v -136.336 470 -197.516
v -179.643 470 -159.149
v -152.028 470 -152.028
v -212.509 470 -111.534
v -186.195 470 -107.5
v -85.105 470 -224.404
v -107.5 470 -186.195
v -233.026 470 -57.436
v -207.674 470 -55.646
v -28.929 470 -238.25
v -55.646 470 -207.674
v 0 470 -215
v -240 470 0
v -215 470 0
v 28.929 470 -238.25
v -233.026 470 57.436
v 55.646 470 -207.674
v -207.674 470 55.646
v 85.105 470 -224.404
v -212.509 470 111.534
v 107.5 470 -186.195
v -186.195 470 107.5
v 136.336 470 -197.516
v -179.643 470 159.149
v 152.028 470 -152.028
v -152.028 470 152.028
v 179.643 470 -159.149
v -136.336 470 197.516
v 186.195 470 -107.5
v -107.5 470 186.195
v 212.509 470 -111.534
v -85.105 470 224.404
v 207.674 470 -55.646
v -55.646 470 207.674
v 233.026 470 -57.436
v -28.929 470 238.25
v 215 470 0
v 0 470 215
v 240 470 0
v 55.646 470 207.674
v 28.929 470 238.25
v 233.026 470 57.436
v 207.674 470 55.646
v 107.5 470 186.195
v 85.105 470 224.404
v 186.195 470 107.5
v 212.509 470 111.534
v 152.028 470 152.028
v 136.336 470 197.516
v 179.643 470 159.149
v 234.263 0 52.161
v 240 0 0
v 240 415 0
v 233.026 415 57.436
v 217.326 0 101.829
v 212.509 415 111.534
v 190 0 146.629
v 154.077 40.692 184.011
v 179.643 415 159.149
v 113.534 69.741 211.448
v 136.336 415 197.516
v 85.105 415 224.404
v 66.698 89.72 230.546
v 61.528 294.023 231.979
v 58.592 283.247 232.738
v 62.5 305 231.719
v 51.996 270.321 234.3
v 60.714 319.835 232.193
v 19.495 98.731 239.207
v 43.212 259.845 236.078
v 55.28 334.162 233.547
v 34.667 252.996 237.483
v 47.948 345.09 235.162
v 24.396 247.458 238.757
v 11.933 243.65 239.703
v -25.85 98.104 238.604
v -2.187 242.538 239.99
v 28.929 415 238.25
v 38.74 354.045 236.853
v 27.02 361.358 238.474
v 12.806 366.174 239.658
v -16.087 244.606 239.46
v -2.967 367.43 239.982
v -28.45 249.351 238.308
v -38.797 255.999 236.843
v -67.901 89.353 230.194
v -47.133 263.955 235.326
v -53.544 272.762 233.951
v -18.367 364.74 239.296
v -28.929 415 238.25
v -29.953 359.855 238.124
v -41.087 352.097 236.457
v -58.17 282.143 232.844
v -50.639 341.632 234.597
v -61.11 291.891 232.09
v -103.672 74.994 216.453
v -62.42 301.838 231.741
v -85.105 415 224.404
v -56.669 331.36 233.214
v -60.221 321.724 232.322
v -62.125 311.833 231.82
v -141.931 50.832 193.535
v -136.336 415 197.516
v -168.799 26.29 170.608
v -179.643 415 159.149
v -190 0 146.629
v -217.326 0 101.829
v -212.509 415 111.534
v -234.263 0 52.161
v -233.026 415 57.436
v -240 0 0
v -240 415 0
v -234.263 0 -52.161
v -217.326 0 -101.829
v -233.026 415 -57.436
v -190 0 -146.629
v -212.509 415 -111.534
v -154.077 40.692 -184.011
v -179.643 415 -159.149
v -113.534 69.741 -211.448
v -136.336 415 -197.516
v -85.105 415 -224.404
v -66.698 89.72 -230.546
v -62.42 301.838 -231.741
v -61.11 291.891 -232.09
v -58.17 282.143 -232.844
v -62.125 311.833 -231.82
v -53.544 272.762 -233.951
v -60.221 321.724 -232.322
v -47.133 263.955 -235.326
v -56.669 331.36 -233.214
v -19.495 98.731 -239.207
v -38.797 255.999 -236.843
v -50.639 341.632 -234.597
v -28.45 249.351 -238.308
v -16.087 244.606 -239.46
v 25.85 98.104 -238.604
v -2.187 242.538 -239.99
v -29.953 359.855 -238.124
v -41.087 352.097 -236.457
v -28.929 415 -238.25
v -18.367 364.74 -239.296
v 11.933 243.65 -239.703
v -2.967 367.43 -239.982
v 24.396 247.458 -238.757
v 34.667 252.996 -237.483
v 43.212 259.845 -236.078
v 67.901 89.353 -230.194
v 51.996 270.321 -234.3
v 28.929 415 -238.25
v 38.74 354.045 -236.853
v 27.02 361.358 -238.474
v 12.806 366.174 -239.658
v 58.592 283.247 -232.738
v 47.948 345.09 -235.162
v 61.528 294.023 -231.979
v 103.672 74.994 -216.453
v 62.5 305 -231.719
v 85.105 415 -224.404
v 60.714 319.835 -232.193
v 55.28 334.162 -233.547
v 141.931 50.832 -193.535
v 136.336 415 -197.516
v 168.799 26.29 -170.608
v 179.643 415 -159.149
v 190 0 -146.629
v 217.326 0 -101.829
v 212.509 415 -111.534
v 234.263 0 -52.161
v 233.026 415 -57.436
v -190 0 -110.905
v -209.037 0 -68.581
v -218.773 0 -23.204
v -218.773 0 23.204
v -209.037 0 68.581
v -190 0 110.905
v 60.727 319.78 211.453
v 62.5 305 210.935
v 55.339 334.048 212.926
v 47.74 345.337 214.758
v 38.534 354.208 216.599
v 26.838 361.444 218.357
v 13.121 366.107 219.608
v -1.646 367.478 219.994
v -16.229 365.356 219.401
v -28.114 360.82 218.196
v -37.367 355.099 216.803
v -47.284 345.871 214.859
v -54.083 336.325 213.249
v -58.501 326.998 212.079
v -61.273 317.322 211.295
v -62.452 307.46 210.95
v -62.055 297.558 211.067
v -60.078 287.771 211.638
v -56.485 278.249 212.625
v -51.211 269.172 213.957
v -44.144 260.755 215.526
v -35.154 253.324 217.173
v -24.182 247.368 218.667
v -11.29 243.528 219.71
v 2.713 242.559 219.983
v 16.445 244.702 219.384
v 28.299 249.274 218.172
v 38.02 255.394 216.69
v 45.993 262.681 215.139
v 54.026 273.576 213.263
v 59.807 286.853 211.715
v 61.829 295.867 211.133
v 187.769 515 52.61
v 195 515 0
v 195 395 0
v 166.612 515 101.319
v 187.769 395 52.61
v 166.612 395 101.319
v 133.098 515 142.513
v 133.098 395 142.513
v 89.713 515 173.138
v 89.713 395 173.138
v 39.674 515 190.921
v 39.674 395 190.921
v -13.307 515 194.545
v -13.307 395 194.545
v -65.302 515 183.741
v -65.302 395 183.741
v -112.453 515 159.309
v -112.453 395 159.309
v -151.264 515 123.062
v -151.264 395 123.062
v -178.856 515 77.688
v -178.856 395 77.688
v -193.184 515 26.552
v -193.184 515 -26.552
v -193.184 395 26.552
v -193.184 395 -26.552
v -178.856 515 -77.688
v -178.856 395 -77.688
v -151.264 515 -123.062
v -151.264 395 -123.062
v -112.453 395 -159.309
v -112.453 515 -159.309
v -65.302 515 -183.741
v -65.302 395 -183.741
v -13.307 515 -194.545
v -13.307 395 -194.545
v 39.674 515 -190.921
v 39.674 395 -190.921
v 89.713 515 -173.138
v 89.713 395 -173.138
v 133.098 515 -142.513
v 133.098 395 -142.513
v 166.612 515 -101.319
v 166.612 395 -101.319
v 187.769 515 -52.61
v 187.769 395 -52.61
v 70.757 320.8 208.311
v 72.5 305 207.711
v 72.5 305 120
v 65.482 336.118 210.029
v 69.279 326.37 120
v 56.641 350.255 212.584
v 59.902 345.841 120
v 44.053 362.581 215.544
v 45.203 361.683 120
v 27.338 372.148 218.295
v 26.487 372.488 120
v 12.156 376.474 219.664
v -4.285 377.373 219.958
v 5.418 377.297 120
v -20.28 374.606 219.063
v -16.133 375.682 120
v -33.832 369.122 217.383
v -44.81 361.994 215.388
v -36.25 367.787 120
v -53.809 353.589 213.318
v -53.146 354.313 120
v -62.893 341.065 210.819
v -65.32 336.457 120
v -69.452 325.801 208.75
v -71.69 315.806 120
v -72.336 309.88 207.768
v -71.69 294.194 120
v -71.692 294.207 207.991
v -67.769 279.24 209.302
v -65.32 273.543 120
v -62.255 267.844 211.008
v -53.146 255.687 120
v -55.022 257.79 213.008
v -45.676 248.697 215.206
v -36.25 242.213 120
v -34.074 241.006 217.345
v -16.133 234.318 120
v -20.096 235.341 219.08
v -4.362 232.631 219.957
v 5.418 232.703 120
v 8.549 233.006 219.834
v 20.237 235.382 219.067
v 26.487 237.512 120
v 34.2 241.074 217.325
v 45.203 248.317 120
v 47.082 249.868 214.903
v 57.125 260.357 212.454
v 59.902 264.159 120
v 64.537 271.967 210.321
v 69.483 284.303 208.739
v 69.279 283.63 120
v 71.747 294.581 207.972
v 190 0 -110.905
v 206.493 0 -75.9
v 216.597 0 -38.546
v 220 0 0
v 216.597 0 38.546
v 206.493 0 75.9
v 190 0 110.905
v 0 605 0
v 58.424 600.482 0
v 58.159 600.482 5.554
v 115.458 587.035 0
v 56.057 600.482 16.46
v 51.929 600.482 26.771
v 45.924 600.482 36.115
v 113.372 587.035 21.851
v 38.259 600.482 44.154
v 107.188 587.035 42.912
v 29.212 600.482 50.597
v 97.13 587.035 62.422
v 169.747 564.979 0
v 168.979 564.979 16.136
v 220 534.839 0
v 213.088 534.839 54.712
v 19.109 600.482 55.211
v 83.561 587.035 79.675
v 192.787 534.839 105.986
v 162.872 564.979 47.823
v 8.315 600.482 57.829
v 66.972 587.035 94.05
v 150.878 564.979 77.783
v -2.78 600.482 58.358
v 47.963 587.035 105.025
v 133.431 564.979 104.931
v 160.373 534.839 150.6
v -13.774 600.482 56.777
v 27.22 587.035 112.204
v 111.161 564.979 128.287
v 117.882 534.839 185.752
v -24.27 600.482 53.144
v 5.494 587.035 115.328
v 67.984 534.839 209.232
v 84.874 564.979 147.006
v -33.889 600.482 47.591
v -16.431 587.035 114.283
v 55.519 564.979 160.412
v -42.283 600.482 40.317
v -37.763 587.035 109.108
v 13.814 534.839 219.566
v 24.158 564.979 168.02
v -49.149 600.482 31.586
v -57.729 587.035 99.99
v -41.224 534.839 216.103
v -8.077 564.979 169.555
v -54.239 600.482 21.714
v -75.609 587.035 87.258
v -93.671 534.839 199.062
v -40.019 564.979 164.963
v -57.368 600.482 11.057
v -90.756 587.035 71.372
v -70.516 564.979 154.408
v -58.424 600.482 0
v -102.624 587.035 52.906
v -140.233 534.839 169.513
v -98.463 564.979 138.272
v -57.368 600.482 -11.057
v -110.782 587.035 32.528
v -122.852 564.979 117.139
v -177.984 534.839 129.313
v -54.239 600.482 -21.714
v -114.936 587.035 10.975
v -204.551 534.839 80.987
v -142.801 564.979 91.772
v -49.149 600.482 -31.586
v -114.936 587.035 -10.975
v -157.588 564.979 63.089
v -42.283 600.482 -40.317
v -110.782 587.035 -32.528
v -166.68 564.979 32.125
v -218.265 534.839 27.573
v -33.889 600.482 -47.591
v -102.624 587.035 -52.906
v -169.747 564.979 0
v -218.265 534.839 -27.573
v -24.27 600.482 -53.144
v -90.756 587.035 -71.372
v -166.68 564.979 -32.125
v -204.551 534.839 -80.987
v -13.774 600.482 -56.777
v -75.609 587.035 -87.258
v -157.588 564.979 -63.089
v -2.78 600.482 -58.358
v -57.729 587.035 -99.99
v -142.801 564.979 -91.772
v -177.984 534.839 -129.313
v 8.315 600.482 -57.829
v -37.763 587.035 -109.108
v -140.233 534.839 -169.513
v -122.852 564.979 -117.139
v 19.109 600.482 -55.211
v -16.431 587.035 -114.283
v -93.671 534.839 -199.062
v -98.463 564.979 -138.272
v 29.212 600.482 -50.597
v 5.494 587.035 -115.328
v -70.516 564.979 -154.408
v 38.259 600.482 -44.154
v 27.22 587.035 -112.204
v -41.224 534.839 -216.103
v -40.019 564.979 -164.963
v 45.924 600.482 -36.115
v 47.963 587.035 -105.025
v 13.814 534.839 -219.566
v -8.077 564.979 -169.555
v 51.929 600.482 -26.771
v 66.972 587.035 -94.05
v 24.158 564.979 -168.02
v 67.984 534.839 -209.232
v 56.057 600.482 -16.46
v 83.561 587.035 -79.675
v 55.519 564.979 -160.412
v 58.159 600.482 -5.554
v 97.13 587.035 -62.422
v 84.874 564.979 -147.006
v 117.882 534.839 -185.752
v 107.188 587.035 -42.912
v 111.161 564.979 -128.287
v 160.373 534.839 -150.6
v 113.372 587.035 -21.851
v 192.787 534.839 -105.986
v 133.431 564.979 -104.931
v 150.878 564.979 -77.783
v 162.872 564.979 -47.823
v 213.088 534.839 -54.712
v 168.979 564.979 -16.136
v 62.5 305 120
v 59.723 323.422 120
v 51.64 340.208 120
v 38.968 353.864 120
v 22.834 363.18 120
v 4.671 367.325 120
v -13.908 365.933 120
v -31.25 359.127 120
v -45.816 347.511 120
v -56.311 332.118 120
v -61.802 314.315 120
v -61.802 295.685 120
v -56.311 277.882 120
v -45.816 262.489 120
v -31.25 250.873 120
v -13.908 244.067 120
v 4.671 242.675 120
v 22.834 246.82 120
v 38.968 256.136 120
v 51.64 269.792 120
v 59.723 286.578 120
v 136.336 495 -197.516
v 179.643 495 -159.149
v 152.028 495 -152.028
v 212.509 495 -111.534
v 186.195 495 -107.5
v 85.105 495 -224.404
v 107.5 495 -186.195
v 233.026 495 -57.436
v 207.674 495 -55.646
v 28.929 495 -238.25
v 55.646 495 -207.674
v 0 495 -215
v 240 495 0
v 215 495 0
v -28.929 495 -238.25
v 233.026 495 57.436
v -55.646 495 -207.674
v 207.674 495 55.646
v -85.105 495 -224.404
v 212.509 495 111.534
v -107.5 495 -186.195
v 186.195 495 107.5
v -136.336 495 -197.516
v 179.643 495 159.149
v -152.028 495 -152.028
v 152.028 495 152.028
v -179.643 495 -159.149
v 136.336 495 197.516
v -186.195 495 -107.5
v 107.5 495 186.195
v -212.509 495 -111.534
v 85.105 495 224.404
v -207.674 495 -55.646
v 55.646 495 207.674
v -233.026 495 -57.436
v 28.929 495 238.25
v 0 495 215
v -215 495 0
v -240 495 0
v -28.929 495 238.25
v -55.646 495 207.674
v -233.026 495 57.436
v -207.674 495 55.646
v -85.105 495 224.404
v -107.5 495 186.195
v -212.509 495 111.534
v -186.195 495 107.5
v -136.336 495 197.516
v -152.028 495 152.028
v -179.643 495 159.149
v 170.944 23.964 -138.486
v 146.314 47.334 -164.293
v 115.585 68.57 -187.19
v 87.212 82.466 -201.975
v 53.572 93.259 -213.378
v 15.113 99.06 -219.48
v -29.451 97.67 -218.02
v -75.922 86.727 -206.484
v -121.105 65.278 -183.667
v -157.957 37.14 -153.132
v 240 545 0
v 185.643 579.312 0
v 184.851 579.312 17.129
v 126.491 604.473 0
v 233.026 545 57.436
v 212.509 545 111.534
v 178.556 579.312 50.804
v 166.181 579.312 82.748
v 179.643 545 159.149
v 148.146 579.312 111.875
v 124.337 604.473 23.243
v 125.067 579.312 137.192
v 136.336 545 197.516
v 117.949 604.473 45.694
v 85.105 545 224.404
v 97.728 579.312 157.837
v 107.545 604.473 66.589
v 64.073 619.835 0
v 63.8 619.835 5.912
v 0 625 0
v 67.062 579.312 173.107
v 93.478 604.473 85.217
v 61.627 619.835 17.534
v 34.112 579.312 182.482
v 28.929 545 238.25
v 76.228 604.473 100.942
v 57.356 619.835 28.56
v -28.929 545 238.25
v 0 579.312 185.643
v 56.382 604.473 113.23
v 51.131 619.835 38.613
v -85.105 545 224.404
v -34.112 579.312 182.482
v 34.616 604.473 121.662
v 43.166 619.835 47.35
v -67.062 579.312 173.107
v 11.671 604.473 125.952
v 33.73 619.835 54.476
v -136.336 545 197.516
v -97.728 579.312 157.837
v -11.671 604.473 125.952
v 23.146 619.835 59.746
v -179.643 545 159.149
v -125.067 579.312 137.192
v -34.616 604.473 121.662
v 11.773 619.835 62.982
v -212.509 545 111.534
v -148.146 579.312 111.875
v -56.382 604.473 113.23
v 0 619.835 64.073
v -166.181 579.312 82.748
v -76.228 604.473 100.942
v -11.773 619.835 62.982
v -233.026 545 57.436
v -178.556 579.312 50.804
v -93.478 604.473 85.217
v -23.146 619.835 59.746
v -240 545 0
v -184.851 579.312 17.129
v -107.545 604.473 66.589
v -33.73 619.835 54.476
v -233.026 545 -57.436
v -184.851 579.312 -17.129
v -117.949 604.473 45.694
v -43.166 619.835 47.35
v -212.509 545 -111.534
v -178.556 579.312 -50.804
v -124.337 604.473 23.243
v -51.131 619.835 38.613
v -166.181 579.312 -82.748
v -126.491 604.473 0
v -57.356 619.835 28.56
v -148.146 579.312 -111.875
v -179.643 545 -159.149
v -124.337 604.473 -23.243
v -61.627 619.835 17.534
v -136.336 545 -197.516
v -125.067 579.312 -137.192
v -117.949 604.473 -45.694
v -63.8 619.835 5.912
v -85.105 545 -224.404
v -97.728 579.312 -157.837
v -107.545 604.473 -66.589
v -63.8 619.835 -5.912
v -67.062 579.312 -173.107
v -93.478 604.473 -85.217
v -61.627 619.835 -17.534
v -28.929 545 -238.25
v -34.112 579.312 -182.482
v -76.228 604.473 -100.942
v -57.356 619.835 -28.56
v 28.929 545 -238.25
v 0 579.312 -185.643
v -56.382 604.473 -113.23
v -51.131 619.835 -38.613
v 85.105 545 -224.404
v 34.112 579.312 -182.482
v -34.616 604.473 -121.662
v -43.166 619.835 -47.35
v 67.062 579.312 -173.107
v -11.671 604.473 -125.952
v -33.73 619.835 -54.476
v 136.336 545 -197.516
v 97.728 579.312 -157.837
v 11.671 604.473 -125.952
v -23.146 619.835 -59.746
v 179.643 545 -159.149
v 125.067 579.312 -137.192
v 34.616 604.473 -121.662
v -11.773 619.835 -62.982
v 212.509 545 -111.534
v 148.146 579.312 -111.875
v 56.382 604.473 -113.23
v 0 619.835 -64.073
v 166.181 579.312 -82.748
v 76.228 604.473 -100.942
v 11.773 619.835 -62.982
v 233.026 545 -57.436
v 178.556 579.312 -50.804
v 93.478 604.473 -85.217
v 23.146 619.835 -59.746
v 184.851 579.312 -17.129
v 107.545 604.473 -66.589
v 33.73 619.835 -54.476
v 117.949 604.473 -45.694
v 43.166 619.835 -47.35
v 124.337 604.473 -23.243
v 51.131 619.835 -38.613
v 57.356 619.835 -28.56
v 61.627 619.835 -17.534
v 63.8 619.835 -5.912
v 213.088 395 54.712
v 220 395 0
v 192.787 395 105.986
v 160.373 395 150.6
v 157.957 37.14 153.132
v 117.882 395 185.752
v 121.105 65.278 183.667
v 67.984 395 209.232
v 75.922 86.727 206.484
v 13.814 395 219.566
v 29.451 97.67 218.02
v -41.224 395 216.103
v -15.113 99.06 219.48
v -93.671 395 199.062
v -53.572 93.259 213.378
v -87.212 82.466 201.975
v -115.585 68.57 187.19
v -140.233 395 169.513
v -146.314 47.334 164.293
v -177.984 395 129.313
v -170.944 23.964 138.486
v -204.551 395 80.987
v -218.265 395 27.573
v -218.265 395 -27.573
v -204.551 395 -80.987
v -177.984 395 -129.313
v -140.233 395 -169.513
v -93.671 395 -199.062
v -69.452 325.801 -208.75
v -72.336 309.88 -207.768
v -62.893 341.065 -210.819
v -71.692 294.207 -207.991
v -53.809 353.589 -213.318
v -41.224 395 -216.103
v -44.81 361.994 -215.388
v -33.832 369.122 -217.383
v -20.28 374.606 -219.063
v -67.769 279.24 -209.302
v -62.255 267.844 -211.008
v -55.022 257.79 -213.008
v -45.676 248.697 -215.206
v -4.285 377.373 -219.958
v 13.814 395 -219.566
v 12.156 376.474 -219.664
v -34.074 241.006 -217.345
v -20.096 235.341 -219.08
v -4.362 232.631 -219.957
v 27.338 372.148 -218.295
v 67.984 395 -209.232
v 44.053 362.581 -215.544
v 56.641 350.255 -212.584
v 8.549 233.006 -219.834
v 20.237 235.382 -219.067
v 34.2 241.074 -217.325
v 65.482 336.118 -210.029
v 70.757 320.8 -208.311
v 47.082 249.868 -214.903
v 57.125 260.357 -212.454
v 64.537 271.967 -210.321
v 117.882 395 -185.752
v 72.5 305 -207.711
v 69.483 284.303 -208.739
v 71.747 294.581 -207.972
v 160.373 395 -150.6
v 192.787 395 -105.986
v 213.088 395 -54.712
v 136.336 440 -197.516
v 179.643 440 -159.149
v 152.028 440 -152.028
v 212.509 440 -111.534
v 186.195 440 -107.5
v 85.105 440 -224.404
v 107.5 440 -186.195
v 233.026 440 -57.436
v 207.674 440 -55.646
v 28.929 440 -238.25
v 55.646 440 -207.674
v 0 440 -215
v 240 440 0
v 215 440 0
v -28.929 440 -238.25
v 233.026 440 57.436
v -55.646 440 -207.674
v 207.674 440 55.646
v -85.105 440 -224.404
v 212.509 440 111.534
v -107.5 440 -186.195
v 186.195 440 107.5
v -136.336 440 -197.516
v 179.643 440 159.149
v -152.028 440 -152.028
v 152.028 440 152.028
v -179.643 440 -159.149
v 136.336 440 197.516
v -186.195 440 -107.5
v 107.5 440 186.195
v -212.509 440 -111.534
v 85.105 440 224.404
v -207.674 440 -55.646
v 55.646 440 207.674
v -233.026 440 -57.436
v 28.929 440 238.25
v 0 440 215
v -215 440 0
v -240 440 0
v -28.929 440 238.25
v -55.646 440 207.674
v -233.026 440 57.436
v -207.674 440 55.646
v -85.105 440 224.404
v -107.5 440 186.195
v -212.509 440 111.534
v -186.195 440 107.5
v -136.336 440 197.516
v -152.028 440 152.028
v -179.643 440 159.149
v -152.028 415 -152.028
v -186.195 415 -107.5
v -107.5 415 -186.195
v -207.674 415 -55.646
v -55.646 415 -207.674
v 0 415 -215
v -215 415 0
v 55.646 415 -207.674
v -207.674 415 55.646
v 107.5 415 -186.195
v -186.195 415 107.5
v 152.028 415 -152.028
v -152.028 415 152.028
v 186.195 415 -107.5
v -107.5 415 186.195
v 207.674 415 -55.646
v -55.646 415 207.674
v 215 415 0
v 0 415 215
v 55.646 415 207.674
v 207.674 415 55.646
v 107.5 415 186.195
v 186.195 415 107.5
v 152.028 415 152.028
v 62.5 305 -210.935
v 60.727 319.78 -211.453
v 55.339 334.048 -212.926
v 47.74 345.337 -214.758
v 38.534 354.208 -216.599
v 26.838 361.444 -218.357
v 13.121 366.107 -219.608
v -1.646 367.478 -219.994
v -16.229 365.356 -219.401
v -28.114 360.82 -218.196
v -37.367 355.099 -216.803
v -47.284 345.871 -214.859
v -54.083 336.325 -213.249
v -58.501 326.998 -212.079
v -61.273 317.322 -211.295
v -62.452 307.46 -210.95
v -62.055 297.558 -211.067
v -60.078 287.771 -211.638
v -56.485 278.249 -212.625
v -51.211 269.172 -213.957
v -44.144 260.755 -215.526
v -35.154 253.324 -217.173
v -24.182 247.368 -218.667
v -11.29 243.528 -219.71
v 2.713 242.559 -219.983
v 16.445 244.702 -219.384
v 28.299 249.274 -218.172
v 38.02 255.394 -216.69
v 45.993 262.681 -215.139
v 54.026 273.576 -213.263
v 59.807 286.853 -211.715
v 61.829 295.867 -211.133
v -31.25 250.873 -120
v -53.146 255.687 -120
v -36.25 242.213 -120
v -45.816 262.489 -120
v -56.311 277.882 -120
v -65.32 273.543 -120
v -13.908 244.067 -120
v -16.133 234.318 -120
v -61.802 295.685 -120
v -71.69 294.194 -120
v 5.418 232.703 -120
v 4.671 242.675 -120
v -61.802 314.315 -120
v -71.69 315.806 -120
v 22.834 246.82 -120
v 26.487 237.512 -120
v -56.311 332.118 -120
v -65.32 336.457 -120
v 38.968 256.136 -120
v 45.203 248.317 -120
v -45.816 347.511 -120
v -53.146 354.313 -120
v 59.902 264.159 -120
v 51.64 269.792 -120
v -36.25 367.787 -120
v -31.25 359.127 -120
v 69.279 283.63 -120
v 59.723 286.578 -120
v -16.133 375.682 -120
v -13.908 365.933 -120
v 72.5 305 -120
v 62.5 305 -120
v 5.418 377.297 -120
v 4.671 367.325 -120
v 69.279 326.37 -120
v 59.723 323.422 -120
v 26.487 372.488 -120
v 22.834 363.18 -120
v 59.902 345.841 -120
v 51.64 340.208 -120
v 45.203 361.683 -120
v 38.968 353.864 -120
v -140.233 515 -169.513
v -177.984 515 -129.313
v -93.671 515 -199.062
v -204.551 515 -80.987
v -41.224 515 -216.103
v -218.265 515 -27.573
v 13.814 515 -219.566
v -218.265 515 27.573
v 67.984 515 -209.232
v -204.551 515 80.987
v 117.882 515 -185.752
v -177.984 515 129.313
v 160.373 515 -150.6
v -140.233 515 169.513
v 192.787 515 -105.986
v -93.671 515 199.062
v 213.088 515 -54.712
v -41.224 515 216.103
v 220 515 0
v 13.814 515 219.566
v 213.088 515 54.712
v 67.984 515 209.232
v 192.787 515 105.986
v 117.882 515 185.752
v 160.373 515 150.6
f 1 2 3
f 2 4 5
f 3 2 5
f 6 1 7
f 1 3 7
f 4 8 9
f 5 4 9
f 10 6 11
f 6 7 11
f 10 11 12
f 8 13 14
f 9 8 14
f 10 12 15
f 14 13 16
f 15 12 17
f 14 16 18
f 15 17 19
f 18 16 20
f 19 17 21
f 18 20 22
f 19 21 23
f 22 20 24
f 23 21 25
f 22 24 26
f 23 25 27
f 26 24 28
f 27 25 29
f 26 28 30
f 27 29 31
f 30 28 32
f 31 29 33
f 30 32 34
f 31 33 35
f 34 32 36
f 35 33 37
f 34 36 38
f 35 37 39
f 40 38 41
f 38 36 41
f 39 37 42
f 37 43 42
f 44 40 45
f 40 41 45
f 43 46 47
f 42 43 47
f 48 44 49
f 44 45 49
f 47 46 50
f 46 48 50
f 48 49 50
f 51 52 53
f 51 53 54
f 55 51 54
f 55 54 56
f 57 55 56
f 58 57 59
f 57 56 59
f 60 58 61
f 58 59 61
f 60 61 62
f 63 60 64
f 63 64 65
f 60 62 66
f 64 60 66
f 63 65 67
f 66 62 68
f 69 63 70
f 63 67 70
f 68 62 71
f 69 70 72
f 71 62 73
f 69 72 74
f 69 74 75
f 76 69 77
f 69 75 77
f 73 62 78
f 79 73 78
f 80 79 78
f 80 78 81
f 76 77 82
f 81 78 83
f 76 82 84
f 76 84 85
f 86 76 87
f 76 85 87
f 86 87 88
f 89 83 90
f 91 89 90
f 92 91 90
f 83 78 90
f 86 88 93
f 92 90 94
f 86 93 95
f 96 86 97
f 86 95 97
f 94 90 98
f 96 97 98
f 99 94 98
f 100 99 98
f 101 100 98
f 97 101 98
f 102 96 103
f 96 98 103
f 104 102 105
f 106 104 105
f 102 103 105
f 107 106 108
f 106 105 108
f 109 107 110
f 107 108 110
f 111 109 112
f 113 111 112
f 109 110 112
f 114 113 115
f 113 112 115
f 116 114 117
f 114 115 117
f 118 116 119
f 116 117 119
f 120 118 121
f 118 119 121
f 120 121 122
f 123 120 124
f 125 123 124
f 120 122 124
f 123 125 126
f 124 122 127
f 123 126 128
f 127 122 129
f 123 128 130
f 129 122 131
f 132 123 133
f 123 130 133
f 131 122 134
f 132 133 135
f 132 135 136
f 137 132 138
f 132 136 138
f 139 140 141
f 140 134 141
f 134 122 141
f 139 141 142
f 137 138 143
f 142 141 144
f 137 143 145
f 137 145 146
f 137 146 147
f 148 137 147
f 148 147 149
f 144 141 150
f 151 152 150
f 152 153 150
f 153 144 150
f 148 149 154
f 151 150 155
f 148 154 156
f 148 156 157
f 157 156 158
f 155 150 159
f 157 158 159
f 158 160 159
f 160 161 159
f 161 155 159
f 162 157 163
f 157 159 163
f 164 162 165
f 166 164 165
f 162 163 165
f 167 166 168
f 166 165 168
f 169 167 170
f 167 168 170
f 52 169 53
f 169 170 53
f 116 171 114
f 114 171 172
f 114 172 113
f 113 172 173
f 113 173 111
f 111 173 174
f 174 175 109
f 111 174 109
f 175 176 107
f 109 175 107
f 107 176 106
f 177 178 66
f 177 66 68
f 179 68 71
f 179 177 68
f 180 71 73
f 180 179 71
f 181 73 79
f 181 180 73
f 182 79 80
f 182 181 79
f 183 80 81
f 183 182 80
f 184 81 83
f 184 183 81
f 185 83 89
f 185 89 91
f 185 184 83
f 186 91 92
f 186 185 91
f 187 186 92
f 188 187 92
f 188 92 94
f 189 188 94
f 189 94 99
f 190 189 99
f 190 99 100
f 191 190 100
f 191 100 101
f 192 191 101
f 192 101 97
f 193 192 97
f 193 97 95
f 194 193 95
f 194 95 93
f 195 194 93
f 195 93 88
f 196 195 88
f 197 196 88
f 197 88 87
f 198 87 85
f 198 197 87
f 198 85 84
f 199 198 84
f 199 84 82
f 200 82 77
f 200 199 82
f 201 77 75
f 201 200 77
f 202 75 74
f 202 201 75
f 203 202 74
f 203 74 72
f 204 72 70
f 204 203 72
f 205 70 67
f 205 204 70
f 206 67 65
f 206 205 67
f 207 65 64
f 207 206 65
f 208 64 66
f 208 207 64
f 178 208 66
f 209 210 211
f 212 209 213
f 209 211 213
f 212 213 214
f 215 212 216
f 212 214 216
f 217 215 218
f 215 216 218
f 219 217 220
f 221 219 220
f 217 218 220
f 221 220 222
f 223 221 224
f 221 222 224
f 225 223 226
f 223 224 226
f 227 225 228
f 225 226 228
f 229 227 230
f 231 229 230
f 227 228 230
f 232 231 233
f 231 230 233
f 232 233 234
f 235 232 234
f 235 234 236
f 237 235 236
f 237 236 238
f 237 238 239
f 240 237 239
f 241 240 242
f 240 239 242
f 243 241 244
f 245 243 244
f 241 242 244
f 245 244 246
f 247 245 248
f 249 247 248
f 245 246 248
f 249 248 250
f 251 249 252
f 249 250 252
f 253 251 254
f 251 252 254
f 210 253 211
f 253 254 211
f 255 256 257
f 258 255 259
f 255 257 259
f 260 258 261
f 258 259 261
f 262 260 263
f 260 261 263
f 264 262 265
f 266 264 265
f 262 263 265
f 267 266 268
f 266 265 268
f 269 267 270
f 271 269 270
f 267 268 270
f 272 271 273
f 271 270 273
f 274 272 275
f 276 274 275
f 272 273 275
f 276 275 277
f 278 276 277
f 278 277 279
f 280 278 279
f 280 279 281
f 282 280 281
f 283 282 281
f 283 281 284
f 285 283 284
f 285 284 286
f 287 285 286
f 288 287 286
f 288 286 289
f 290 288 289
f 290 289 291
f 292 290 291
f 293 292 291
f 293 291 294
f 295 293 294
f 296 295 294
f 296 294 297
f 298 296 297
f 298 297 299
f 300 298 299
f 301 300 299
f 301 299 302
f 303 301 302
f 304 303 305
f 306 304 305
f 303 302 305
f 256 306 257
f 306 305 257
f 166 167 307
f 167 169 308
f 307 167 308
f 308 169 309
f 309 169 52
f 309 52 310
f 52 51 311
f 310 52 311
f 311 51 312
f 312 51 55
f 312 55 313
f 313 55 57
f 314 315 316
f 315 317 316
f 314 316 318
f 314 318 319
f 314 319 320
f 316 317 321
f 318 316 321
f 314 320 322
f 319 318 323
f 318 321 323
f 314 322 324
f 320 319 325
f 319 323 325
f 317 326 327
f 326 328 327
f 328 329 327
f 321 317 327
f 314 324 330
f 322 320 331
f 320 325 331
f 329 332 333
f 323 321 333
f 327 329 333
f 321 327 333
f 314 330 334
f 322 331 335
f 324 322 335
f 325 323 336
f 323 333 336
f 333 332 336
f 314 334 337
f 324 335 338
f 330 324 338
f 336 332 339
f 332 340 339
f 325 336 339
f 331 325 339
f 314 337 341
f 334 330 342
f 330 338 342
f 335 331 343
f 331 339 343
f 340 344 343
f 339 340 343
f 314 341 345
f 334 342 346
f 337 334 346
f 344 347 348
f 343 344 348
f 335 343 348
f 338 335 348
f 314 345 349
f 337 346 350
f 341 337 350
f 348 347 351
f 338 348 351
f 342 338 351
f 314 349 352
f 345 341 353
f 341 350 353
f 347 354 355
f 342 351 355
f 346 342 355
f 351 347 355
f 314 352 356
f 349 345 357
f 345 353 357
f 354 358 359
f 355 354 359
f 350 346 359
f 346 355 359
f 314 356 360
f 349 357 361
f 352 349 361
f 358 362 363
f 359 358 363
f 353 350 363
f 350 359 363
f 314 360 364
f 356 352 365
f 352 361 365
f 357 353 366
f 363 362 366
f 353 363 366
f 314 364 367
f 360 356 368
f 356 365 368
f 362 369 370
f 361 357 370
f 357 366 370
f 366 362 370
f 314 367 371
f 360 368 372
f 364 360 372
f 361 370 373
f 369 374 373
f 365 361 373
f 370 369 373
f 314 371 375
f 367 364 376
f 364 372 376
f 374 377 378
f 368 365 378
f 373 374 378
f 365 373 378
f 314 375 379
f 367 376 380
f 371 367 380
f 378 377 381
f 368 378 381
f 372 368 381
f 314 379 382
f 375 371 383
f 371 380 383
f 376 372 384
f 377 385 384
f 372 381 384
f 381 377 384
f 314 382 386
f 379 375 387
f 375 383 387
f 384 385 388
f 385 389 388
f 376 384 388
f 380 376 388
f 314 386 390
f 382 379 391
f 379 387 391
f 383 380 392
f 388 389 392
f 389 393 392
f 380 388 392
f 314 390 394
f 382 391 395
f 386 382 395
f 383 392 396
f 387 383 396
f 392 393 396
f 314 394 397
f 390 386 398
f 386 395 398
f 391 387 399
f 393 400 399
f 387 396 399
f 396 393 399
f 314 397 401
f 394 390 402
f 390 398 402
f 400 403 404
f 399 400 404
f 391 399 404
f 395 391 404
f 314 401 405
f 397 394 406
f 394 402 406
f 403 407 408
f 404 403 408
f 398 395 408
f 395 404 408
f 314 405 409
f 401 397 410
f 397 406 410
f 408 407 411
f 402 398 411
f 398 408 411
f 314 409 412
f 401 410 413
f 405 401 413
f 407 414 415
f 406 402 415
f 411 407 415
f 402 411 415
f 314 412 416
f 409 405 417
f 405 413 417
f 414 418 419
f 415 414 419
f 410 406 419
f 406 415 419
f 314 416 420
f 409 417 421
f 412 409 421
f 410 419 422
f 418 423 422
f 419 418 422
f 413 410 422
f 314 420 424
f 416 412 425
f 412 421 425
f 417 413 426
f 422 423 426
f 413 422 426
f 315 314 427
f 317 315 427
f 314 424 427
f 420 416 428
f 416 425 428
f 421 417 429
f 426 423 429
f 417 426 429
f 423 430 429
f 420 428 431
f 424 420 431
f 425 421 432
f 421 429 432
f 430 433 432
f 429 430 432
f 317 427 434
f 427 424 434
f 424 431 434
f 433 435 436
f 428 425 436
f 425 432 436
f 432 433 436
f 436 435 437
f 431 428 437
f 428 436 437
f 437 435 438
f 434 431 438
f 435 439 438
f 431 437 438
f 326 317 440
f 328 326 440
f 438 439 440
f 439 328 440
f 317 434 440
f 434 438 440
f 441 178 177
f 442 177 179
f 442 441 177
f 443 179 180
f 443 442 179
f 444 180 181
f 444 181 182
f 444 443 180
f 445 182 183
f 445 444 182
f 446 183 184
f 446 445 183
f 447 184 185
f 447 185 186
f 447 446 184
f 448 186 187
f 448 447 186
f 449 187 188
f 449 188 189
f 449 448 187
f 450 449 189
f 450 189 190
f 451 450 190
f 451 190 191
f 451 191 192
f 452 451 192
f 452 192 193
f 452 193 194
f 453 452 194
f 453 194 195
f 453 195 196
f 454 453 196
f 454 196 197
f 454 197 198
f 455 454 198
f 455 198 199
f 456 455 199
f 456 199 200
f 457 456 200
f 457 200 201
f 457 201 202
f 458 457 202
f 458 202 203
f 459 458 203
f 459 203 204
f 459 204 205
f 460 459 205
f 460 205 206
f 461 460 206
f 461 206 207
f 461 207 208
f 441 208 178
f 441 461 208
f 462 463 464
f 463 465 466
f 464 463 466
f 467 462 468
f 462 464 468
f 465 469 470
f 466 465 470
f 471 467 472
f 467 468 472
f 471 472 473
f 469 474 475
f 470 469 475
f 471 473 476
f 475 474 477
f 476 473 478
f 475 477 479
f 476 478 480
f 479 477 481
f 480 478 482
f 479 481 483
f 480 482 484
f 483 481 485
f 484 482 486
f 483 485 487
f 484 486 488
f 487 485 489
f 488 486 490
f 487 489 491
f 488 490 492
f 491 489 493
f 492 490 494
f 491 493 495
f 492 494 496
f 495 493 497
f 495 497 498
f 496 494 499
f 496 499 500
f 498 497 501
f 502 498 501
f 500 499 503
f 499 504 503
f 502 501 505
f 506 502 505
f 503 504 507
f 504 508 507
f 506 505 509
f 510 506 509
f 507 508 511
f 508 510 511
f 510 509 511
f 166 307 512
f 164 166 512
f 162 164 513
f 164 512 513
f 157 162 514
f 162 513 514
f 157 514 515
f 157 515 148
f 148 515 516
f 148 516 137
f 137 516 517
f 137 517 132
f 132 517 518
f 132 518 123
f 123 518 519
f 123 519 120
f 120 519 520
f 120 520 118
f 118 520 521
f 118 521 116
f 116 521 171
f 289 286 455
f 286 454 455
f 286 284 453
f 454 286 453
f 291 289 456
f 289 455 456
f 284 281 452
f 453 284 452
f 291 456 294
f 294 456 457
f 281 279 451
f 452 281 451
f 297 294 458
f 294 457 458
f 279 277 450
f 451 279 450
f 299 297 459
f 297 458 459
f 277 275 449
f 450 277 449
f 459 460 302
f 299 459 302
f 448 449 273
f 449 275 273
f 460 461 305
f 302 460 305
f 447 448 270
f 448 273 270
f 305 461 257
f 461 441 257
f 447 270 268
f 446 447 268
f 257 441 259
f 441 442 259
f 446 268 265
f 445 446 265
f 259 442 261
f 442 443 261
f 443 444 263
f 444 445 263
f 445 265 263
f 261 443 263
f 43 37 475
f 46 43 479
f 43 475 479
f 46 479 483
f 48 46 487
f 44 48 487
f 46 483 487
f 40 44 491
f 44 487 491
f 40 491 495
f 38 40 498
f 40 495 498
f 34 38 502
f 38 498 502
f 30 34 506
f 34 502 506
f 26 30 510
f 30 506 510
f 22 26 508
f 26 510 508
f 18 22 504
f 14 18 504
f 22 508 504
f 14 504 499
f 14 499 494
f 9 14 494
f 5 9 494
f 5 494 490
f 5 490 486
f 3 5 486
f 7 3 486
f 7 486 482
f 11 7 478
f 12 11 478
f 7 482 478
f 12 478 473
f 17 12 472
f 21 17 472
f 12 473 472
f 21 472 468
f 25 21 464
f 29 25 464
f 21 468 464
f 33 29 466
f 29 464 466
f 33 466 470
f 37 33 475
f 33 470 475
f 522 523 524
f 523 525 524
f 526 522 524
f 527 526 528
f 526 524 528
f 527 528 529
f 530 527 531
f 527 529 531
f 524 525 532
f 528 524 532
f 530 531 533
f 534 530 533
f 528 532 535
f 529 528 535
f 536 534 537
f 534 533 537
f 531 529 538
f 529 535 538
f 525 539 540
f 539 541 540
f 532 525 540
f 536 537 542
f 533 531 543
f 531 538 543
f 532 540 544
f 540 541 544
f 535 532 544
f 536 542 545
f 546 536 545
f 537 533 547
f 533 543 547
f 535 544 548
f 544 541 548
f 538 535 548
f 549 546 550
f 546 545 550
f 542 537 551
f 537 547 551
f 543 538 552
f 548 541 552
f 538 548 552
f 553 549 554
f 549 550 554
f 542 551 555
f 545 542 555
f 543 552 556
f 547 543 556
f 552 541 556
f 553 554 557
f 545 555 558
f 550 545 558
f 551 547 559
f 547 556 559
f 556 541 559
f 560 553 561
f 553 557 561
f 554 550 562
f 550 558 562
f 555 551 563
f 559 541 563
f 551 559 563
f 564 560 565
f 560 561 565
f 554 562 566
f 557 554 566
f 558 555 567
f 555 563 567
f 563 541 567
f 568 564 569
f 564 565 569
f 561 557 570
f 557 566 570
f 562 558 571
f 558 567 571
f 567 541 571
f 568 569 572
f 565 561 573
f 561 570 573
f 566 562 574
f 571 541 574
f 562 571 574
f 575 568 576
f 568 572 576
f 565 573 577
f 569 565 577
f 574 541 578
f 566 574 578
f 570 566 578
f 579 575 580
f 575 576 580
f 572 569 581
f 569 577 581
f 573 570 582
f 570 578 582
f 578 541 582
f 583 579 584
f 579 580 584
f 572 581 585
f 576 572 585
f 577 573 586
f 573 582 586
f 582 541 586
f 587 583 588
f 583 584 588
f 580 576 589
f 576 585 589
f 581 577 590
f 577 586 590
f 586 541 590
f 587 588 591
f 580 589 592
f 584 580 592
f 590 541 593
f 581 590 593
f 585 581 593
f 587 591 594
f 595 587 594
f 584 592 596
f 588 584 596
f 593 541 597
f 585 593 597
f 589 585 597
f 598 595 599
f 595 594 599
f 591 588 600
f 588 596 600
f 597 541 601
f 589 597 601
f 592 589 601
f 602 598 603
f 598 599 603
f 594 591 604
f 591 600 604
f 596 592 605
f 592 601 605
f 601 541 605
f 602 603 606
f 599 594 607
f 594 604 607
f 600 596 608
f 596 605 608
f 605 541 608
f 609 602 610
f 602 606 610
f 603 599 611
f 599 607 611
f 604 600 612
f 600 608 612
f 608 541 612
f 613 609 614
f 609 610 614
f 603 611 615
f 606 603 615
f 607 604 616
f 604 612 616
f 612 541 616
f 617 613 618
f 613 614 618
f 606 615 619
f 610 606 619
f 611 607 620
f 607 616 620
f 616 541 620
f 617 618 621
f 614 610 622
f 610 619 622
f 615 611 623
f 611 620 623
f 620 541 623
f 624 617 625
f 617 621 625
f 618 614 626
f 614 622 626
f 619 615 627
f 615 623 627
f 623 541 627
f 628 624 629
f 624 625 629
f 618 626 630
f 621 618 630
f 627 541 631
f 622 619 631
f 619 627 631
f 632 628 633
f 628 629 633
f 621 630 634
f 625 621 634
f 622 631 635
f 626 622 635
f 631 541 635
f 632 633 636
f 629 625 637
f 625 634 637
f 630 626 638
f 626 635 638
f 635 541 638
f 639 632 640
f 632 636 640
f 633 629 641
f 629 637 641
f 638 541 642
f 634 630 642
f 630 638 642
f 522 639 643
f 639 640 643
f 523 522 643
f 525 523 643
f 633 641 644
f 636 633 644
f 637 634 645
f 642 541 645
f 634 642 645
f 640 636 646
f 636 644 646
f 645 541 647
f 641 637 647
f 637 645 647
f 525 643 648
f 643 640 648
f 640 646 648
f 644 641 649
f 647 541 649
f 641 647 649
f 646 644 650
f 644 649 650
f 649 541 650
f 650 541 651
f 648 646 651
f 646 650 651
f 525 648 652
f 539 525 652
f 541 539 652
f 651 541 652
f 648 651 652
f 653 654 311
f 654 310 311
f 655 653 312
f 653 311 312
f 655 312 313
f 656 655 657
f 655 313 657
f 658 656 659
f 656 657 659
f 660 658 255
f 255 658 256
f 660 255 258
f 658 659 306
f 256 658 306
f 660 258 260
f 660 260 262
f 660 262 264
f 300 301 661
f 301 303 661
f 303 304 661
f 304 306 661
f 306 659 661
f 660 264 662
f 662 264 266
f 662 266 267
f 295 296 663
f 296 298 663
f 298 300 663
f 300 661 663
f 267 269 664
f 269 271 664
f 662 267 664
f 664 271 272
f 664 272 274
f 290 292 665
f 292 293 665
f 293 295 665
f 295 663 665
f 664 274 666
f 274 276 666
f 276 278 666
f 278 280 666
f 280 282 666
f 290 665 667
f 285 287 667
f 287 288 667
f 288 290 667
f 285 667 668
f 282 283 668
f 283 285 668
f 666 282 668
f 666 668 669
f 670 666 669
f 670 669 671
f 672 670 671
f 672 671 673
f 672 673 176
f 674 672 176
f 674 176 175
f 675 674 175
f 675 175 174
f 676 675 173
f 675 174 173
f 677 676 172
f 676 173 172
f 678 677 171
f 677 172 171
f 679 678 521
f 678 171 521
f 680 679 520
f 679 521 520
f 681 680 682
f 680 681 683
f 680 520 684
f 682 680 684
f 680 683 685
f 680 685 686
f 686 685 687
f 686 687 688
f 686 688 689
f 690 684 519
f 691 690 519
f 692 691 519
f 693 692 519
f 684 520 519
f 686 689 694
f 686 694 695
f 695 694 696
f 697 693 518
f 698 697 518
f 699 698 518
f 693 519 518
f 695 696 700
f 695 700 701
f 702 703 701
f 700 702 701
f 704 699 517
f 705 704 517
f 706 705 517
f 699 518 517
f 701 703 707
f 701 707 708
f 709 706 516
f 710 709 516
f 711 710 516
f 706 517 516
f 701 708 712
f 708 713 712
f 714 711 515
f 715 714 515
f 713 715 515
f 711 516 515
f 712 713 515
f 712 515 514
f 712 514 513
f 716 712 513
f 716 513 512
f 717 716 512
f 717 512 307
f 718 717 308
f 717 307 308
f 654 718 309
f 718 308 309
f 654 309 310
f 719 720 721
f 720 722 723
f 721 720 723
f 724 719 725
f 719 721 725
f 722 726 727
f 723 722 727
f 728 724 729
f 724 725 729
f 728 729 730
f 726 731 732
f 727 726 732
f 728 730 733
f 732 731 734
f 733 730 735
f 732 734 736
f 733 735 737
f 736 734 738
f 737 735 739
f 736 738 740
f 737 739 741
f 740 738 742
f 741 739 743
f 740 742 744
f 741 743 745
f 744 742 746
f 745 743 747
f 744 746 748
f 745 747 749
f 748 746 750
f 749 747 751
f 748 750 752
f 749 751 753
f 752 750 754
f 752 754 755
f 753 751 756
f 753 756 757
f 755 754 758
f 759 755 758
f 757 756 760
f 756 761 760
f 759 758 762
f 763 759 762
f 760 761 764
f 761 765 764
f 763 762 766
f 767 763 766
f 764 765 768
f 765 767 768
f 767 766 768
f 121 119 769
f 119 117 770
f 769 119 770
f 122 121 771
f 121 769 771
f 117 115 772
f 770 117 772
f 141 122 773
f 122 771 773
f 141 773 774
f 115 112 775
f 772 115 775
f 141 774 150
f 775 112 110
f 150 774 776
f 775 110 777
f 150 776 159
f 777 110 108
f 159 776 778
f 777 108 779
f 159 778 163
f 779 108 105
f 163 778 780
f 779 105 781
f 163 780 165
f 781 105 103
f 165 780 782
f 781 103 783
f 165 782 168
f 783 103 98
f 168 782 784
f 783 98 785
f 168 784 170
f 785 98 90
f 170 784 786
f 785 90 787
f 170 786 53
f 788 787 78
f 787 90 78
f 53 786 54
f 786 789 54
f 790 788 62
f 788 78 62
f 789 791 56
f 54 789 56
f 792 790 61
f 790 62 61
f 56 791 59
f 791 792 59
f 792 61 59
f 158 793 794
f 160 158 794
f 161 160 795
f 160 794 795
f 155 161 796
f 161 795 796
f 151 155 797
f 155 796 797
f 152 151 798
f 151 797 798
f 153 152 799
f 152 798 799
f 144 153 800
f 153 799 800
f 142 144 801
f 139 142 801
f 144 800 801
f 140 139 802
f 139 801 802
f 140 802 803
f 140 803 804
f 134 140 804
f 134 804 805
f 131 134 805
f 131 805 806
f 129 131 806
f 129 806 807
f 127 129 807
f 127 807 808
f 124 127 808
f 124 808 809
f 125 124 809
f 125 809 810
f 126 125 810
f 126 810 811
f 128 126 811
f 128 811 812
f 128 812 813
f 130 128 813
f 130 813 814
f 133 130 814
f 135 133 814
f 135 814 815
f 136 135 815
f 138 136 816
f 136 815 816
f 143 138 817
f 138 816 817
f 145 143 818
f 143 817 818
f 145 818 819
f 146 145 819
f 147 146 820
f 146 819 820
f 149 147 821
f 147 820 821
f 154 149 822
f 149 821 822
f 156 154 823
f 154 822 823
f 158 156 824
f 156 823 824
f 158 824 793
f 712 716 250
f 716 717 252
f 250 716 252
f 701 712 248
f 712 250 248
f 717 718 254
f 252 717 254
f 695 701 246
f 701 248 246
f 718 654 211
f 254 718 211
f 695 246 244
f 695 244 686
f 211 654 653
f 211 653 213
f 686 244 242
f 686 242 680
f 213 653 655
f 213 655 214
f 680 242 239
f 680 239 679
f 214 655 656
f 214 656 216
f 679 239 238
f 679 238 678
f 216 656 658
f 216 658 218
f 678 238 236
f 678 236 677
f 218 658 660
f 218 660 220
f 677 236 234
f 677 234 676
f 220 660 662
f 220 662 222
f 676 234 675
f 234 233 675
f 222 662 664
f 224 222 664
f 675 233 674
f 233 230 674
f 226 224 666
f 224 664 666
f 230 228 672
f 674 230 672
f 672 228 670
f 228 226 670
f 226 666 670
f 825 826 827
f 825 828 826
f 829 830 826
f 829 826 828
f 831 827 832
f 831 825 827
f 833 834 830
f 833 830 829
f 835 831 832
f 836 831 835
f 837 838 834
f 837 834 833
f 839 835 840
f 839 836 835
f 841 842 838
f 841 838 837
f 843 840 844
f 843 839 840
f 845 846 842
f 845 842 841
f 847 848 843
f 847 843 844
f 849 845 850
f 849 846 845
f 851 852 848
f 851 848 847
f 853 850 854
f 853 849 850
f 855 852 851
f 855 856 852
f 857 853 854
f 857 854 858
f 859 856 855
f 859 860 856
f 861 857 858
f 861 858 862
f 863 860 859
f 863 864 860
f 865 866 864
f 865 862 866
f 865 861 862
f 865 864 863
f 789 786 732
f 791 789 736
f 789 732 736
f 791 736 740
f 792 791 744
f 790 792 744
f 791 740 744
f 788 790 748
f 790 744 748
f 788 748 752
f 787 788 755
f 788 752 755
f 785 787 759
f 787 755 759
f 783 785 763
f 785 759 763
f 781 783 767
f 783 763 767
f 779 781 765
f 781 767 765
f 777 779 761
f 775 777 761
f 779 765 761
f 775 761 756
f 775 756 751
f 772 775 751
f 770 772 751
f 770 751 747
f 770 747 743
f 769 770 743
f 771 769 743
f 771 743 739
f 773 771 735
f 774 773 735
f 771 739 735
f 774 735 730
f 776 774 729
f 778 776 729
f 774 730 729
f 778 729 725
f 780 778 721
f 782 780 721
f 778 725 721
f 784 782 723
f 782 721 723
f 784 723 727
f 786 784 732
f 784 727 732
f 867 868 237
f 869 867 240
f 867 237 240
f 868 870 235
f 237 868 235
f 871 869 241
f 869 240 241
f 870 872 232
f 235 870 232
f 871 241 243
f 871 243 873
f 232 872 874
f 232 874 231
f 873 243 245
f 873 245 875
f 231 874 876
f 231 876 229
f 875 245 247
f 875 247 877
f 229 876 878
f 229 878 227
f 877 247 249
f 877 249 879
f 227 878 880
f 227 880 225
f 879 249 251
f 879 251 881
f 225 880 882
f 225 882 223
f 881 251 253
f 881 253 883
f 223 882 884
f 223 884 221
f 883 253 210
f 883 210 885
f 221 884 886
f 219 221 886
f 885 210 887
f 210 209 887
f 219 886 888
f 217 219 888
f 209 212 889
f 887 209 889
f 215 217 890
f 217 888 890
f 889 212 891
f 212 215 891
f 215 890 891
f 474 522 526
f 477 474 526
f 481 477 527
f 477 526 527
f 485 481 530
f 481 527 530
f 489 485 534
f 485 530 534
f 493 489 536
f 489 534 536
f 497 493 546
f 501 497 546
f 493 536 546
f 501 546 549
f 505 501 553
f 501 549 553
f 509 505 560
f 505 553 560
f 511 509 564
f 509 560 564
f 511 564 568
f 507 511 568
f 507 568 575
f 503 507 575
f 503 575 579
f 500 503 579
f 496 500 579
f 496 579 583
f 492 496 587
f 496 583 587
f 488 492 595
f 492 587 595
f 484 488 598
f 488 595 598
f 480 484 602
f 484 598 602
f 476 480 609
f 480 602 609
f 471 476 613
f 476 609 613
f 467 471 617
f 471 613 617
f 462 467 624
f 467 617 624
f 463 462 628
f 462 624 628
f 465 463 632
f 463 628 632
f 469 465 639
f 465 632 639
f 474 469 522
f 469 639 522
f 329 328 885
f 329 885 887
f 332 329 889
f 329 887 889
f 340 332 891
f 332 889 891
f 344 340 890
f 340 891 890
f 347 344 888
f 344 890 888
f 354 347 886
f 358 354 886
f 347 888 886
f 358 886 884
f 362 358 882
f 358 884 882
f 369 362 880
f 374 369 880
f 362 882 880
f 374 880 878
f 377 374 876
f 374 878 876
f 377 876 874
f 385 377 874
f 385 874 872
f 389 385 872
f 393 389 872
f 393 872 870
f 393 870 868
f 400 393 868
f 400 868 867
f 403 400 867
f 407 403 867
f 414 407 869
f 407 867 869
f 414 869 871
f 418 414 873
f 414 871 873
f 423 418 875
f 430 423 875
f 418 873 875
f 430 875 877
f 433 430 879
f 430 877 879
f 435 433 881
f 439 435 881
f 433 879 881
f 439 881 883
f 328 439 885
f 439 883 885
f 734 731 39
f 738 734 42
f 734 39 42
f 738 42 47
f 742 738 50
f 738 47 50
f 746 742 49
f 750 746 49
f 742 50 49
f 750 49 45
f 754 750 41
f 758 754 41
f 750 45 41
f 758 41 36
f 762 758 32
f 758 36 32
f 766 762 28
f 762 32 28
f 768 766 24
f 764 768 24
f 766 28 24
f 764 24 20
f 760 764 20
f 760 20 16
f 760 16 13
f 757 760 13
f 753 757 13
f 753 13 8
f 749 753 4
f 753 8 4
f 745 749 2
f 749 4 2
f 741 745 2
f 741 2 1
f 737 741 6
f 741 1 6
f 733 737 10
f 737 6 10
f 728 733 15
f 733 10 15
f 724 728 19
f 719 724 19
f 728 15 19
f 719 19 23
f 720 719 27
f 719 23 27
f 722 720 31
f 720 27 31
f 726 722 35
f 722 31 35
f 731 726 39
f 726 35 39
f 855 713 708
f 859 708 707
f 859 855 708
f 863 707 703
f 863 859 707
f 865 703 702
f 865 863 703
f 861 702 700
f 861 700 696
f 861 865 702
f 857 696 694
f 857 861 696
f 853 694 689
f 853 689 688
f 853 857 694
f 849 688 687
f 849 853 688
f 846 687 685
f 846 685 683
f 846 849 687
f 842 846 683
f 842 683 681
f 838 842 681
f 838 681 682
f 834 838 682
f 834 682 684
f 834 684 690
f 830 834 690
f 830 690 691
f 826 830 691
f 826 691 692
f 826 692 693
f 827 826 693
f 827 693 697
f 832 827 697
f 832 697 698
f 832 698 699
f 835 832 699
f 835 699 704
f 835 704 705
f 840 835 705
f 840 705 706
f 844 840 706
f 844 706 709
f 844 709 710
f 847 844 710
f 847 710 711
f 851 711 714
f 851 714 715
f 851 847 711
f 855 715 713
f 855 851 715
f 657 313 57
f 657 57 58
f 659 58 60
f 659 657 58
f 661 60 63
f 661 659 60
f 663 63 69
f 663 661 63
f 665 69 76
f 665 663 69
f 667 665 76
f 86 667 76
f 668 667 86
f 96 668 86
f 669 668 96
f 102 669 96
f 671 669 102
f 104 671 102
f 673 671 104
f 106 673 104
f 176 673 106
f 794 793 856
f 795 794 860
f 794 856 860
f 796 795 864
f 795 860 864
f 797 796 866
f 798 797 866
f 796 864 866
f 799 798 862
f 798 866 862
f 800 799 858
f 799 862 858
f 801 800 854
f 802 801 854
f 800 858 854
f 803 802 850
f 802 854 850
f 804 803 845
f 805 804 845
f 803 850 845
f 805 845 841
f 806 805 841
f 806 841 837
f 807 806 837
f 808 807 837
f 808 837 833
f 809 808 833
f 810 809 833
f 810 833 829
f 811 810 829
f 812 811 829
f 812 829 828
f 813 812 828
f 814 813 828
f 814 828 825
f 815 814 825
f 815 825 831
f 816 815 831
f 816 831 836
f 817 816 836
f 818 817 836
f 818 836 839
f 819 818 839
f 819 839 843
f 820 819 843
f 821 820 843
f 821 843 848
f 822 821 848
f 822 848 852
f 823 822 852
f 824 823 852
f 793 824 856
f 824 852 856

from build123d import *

# Parameters (mm, degrees)
CUT_EXTRUDE1_DEPTH      = 241
CUT_EXTRUDE1_DEPTH_BACK = 241
SKETCH4_R               = 62.5
CUT_EXTRUDE2_DEPTH      = 241.0000001
CUT_EXTRUDE2_DEPTH_BACK = 241.0000001
BOSS_EXTRUDE1_REACH     = 122
SKETCH5_R               = 72.5
SKETCH5_R_2             = 62.5


with BuildPart() as part:
    # Sketch1 → Revolve2 (revolve)
    with BuildSketch(Plane.XY):
        with BuildLine():
            Line((0, 625), (0, 605))
            ThreePointArc((0, 605), (115.458447667, 587.035007786), (220, 534.838667697))
            Line((220, 534.838667697), (220, 515))
            Line((220, 515), (195, 515))
            Line((195, 515), (195, 455))
            Line((195, 455), (195, 395))
            Line((195, 395), (220, 395))
            Line((220, 395), (220, 0))
            Line((220, 0), (240, 0))
            Line((240, 0), (240, 415))
            Line((240, 415), (215, 415))
            Line((215, 415), (215, 440))
            Line((215, 440), (240, 440))
            Line((240, 440), (240, 470))
            Line((240, 470), (215, 470))
            Line((215, 470), (215, 495))
            Line((215, 495), (240, 495))
            Line((240, 495), (240, 545))
            ThreePointArc((240, 545), (126.491106407, 604.47331922), (0, 625))
        make_face()
    revolve(axis=Axis((0, 625, 0), (0, -1, 0)))

    # Sketch2 → Cut-Extrude1 (cut, two sides)
    with BuildSketch(Plane.XY) as cut_extrude1_sk:
        with BuildLine():
            Line((-190, 0), (190, 0))
            ThreePointArc((190, 0), (0, 99.55454139), (-190, 0))
        make_face()
    extrude(amount=CUT_EXTRUDE1_DEPTH, mode=Mode.SUBTRACT)
    extrude(cut_extrude1_sk.sketch, amount=-CUT_EXTRUDE1_DEPTH_BACK, mode=Mode.SUBTRACT)

    # Sketch4 → Cut-Extrude2 (cut, two sides)
    with BuildSketch(Plane.XY) as cut_extrude2_sk:
        with Locations((0, 305)):
            Circle(SKETCH4_R)
    extrude(amount=CUT_EXTRUDE2_DEPTH, mode=Mode.SUBTRACT)
    extrude(cut_extrude2_sk.sketch, amount=-CUT_EXTRUDE2_DEPTH_BACK, mode=Mode.SUBTRACT)

    # Sketch5 → Boss-Extrude1 (add, up to next)
    with BuildSketch(Plane.XY.offset(120), mode=Mode.PRIVATE) as boss_extrude1_sk1:
        with Locations((0, 305)):
            Circle(SKETCH5_R)
        with Locations((0, 305)):
            Circle(SKETCH5_R_2, mode=Mode.SUBTRACT)
    boss_extrude1_tool1 = extrude(boss_extrude1_sk1.sketch, amount=BOSS_EXTRUDE1_REACH, mode=Mode.PRIVATE) - part.part
    add(boss_extrude1_tool1.solids().sort_by_distance((-70.44939, 305, 120))[0])

    # Mirror1: part across plane


with BuildPart() as part_1:
    add(part.part)
    add(part.part.mirror(Plane.XY))


solid = part_1.part
